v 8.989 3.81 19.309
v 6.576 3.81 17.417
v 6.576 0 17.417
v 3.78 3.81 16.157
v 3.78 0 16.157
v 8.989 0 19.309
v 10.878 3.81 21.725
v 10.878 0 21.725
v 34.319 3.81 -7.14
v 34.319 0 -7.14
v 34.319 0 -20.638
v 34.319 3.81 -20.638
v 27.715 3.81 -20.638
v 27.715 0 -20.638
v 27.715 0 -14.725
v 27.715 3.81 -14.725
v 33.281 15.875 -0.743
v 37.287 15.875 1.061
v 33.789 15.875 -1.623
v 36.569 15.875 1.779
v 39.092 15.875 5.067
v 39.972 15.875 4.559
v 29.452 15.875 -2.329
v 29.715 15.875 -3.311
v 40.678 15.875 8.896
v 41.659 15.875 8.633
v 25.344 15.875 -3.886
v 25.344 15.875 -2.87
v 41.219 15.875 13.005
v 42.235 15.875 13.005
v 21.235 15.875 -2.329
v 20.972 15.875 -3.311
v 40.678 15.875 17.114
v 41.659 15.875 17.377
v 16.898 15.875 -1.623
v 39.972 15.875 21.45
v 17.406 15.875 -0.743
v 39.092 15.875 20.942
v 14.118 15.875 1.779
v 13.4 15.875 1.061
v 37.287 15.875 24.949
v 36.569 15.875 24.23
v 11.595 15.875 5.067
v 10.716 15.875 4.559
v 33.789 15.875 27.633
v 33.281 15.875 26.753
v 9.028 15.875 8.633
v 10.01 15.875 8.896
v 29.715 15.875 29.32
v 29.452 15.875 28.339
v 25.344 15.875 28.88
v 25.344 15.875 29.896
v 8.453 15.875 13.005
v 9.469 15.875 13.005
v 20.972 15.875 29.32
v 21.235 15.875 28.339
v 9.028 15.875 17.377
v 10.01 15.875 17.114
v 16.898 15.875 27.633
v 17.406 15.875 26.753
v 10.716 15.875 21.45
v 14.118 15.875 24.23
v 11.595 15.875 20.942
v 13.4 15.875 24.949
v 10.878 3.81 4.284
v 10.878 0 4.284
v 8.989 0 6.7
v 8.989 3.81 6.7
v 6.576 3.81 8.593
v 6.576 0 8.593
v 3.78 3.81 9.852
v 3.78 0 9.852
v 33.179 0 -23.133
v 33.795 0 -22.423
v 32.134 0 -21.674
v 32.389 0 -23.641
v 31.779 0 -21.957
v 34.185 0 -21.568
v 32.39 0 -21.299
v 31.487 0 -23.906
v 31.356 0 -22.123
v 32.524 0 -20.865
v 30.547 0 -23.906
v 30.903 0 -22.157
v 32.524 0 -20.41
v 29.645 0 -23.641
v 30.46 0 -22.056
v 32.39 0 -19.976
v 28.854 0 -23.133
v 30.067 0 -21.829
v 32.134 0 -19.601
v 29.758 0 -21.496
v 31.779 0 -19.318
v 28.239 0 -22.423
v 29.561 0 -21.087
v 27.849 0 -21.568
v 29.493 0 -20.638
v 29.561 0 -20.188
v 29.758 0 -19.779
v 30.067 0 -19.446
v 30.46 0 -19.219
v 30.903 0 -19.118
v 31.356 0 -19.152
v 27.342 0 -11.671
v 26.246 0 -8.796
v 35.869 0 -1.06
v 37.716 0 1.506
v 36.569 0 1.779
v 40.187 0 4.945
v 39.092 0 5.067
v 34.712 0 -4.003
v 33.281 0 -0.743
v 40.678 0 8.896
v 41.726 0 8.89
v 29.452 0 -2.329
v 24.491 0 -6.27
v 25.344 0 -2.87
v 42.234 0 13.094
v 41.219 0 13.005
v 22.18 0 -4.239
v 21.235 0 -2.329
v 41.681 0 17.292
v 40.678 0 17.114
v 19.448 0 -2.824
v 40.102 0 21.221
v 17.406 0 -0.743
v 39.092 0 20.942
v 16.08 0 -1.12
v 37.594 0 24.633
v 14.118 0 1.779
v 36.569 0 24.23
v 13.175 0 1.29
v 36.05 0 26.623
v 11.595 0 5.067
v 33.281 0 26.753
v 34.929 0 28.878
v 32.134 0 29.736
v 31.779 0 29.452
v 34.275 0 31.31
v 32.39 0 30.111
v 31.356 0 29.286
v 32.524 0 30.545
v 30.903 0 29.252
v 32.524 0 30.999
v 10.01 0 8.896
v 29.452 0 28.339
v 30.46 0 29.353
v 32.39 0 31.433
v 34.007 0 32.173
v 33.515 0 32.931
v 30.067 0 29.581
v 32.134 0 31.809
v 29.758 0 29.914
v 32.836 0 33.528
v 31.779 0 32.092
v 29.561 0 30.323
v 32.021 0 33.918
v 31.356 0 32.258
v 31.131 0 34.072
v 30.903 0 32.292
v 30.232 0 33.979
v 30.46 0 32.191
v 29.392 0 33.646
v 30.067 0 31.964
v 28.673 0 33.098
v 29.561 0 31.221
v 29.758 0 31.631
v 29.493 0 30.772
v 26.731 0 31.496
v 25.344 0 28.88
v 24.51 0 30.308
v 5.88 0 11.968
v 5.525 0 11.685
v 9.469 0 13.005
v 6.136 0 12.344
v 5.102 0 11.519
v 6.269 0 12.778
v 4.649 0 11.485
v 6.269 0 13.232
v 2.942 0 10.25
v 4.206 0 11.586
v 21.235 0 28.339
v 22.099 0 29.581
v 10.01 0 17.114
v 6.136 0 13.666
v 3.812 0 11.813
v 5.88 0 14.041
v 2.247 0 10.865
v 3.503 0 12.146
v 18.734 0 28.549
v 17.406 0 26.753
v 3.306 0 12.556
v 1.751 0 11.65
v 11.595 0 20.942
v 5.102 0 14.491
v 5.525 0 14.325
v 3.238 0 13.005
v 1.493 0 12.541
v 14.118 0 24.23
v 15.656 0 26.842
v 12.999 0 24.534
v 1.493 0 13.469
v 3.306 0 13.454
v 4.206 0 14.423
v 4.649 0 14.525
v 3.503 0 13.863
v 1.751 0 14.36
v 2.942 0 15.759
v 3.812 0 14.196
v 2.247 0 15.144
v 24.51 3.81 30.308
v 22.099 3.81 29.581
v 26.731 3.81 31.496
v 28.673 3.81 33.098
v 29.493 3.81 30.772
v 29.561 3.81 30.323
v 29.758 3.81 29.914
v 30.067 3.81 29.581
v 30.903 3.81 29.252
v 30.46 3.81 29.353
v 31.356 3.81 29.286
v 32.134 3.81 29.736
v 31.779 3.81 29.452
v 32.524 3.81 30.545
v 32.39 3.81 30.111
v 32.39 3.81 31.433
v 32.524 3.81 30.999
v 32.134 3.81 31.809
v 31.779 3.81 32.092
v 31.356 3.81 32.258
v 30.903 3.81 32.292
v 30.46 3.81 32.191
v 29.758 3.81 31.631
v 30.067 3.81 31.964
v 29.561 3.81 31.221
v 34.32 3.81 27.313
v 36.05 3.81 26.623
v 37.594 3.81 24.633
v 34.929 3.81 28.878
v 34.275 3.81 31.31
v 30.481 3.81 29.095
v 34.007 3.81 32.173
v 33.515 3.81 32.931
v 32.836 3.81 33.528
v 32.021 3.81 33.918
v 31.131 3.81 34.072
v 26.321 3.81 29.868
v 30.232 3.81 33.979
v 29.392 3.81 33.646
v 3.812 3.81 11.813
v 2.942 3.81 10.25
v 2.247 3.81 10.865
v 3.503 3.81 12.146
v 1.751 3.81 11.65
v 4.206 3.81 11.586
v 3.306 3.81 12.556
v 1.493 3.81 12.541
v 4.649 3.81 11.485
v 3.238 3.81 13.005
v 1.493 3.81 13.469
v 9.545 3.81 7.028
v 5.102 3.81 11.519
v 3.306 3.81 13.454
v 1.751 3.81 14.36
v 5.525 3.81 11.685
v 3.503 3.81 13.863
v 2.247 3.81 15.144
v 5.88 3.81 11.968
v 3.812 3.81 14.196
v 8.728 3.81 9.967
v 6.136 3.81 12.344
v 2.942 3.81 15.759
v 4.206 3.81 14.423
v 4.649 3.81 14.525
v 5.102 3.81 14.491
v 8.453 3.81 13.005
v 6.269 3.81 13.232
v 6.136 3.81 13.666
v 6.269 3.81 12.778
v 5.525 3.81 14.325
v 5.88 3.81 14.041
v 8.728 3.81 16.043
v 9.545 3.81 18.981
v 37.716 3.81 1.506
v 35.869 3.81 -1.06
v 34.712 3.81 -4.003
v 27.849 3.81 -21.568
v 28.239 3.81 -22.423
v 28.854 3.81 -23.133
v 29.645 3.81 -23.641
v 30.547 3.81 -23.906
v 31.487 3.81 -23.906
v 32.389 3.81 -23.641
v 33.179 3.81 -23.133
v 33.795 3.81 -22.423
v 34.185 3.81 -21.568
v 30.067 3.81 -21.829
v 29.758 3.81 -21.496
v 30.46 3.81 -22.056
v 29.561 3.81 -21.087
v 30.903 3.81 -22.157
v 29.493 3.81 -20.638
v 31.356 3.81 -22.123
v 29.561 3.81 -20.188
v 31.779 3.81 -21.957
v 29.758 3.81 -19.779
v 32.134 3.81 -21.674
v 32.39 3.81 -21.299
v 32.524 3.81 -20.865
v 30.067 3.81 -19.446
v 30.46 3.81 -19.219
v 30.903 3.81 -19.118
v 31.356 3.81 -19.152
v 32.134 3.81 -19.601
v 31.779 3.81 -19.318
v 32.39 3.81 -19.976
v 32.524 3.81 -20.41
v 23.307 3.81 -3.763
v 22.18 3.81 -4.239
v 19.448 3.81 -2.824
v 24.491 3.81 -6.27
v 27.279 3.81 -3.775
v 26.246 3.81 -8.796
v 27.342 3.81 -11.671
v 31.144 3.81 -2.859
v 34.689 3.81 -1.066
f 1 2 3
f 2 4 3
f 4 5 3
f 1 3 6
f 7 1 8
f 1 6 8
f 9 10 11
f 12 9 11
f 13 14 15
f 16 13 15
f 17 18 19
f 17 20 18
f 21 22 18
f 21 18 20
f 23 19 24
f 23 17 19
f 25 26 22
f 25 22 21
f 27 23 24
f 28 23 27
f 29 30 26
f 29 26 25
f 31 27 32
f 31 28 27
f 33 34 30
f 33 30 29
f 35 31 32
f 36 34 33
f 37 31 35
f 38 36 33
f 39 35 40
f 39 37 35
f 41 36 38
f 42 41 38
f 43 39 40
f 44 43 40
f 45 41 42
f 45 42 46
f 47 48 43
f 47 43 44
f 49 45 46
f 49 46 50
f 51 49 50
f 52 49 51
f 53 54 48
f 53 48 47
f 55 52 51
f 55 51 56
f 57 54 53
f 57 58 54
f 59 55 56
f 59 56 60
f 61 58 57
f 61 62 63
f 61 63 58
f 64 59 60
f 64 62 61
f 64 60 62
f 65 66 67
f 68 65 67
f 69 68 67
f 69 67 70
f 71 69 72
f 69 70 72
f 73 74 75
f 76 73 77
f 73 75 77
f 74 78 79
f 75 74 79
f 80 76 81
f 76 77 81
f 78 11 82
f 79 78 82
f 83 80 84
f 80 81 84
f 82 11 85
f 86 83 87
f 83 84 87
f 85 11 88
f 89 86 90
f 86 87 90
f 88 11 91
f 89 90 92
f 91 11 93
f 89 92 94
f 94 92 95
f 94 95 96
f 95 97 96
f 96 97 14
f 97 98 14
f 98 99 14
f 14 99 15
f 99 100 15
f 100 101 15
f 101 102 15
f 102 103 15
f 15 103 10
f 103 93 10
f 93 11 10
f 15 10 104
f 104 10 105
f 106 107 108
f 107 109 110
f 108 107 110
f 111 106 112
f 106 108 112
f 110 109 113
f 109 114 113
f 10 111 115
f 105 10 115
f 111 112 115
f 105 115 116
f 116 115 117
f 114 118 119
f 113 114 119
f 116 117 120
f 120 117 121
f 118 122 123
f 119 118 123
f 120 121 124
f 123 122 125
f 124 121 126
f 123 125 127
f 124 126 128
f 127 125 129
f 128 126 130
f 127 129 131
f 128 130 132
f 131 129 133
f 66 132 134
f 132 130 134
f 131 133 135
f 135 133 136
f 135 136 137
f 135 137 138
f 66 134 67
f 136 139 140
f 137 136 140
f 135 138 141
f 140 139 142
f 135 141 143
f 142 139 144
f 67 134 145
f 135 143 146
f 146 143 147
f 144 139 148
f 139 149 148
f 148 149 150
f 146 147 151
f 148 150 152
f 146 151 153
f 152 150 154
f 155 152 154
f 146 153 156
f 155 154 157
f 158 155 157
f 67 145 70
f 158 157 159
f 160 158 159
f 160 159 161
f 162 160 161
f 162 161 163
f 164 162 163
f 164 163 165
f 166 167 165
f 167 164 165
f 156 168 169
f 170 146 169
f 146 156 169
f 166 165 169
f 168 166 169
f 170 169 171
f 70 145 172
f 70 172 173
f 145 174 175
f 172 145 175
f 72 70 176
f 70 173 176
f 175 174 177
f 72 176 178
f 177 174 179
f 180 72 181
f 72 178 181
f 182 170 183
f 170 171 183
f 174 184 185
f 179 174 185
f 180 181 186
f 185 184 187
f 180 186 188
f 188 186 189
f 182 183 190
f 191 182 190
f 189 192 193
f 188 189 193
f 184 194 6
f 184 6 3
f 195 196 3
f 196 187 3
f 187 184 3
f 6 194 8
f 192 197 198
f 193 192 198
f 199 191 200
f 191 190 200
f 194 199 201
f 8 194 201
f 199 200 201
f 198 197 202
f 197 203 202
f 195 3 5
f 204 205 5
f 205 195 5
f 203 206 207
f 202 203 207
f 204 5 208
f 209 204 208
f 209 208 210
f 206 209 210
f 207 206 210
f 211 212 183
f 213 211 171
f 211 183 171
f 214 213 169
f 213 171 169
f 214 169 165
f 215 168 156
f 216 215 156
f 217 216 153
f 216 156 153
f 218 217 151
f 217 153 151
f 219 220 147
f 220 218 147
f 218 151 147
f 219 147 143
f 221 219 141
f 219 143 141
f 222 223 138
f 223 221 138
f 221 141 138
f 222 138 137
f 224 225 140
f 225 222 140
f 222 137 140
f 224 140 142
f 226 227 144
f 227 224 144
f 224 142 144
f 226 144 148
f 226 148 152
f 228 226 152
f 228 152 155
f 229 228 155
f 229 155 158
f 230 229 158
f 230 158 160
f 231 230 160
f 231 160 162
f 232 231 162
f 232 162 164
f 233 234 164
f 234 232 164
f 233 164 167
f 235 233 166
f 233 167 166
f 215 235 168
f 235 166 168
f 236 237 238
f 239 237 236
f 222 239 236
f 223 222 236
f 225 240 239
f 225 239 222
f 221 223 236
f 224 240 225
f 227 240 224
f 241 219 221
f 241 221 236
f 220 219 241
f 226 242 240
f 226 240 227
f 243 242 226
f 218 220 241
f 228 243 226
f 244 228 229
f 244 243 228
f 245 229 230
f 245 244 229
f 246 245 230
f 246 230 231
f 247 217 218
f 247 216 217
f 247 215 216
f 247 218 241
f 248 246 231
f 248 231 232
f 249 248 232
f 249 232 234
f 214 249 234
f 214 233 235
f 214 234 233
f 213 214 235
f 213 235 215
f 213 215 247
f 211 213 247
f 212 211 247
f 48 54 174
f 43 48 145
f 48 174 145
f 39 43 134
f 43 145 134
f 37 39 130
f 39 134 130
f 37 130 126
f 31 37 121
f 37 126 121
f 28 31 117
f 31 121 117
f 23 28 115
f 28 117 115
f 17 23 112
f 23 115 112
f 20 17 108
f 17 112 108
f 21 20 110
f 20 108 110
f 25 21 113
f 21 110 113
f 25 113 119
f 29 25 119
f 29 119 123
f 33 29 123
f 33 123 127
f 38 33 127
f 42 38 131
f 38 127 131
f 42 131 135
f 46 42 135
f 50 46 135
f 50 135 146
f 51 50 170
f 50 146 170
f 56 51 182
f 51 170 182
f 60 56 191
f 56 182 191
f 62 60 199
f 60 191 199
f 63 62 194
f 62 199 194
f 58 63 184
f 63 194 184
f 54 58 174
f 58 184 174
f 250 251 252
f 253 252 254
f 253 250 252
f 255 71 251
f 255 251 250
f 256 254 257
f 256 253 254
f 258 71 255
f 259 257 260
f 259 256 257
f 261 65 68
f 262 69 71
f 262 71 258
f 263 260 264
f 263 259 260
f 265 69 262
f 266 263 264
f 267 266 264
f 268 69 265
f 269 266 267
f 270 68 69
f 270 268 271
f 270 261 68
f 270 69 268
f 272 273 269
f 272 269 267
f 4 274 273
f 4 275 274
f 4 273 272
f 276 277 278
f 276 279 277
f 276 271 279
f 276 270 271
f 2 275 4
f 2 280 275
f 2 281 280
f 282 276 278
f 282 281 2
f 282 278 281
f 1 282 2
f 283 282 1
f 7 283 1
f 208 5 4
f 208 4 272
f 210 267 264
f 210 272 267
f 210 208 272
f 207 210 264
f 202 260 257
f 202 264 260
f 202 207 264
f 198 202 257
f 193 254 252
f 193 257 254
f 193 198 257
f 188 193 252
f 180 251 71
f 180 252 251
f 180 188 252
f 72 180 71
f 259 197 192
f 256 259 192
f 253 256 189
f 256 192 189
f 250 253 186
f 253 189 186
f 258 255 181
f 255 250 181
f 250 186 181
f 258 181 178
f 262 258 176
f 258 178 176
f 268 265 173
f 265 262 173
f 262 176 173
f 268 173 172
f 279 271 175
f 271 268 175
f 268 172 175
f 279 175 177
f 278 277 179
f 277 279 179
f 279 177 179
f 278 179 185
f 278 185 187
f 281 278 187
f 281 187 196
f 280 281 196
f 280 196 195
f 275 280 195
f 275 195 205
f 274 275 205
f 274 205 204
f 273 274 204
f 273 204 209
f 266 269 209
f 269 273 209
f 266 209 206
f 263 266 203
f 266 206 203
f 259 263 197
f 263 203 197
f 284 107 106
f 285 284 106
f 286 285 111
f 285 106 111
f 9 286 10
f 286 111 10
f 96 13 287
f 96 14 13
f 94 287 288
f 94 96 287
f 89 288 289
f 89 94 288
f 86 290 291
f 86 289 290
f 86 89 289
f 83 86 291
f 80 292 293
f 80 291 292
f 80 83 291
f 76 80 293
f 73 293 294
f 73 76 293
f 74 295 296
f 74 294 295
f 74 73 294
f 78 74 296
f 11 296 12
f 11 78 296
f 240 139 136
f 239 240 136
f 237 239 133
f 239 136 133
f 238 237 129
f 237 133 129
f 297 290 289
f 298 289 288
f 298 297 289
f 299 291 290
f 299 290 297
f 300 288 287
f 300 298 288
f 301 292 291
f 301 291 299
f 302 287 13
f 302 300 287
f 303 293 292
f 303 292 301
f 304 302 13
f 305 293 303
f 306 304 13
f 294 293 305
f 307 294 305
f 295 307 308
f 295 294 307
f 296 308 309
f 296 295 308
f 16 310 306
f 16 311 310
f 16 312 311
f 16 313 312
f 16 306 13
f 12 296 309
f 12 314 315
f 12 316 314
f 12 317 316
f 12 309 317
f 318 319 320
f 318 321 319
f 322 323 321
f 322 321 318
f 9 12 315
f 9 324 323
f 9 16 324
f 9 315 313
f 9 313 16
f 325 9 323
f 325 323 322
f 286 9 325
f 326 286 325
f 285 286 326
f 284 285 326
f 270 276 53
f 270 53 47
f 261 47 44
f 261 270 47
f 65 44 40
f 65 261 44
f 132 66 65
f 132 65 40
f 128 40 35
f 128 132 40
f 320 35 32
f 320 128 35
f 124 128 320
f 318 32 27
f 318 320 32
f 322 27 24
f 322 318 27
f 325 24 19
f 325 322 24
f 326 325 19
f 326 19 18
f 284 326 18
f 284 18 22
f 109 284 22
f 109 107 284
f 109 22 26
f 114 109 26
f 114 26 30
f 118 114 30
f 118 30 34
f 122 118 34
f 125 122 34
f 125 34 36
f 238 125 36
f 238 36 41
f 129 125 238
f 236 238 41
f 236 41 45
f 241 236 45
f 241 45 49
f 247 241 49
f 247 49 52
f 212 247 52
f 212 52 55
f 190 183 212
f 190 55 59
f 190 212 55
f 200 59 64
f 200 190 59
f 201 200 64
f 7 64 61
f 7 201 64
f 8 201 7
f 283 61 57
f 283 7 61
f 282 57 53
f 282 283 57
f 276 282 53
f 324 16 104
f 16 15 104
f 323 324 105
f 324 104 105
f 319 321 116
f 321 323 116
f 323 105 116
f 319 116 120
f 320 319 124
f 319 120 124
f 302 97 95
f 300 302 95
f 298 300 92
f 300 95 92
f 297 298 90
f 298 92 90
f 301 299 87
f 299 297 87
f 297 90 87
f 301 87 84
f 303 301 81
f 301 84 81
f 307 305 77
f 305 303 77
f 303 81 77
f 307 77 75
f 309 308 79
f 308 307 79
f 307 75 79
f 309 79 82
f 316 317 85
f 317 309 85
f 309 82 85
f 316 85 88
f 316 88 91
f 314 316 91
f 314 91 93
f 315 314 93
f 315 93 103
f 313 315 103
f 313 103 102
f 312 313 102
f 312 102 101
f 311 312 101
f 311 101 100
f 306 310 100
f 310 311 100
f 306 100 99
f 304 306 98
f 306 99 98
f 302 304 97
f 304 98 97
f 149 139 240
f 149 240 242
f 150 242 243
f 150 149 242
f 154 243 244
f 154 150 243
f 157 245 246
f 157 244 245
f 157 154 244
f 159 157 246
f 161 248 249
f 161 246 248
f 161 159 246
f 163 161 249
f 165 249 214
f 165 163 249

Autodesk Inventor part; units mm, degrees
ref_plane "YZ Plane" through (0, 0, 0) normal (1, 0, 0) x (0, 1, 0)
ref_plane "XZ Plane" through (0, 0, 0) normal (0, 1, 0) x (-1, 0, 0)
ref_plane "XY Plane" through (0, 0, 0) normal (0, 0, 1) x (1, 0, 0)
sketch "Sketch2" plane through (0, 0, 0) normal (0, 1, 0) x (-1, 0, 0)
  circle A0 centre (-4.7625, 13.0048) radius 1.524 construction
  circle A1 centre (-25.3436, 13.0048) radius 6.35 construction
  circle A2 centre (-31.0168, 30.7721) radius 1.524 construction
  circle A3 centre (-31.0168, -20.6375) radius 1.524 construction
  line L0 (-38.1807, -25.4) -> (-38.1807, 35.5346) construction
  line L1 (-23.8528, -25.4) -> (-38.1807, -25.4) construction
  line L2 (-23.8528, 0) -> (-23.8528, -25.4) construction
  line L3 (0, 0) -> (-23.8528, 0) construction
  line L4 (0, 26.0096) -> (0, 0) construction
  line L5 (-23.8528, 26.0096) -> (0, 26.0096) construction
  line L6 (-23.8528, 26.0096) -> (-23.8528, 35.5346) construction
  line L7 (-38.1807, 35.5346) -> (-23.8528, 35.5346) construction
  point P0 (-23.8528, 13.0048)
  dimension "d3" = 3.048
  dimension "d4" = 12.7
  dimension "d5" = 90
  dimension "d6" = 23.8528
  dimension "d7" = 38.1807
  dimension "d8" = 26.0096
  dimension "d9" = 25.4
  dimension "d10" = 35.5346
  dimension "d11" = 0
  dimension "d12" = 0
  dimension "d13" = 23.8528
  dimension "d14" = 4.7625
  dimension "d15" = 13.0048
  dimension "d16" = 23.8528
  dimension "d17" = 13.0048
  dimension "d18" = 25.3436
  dimension "d19" = 13.0048
  dimension "d20" = 31.0167
  dimension "d21" = 30.7721
  dimension "d22" = 31.0167
  dimension "d23" = 20.6375
sketch "Sketch3" plane through (0, 0, 0) normal (0, 1, 0) x (-1, 0, 0)
  circle A0 centre (-25.3436, 13.0048) radius 15.875
  circle A1 centre (-31.0168, 30.7721) radius 1.524
  circle A2 centre (-4.7625, 13.0048) radius 1.524
  circle A3 centre (-31.0168, -20.6375) radius 1.524
  line L0 (-31.0168, 30.7721) -> (-31.0168, -20.6375) construction
  line L1 (-4.7625, 13.0048) -> (-31.0168, 13.0048) construction
  line L2 (-4.7625, 13.0048) -> (-3.2385, 13.0048) construction
  line L3 (-3.2385, 13.0048) -> (-3.2385, 32.2961) construction
  line L4 (-3.2385, 32.2961) -> (-31.0168, 32.2961) construction
  line L5 (-3.2385, 13.0048) -> (-3.2385, -22.1615) construction
  line L6 (-3.2385, -22.1615) -> (-31.0168, -22.1615) construction
  line L7 (-32.5408, 30.7721) -> (-32.5408, -22.1615) construction
  line L8 (-32.5408, -22.1615) -> (-31.0168, -22.1615) construction
  line L9 (-31.0168, 32.2961) -> (-32.5408, 32.2961) construction
  line L10 (-32.5408, 32.2961) -> (-32.5408, 30.7721) construction
  line L11 (-31.0168, 42.8789) -> (7.3443, 42.8789) construction
  line L12 (7.3443, 42.8789) -> (7.3443, 13.0048) construction
  line L13 (7.3443, 13.0048) -> (7.3443, -32.7443) construction
  line L14 (7.3443, -32.7443) -> (-15.7768, -32.7443) construction
  line L15 (-15.7768, -32.7443) -> (-27.8836, -32.7443) construction
  line L16 (-43.1236, 30.7721) -> (-43.1236, 42.8789) construction
  line L17 (-43.1236, 42.8789) -> (-31.0168, 42.8789) construction
  line L18 (-25.3436, 13.0048) -> (-35.5036, 13.0048) construction
  arc A4 (-25.3436, -2.8702) -> (-25.3436, 28.8798) centre (-25.3436, 13.0048) ccw
  line L19 (-27.8836, -32.7443) -> (-27.8836, -2.8702) construction
  line L20 (-43.1236, 28.8798) -> (-43.1236, 30.7721) construction
  line L21 (-34.3188, 30.7721) -> (-34.3188, 27.314)
  line L22 (-34.3188, -1.3044) -> (-34.3188, -20.6375)
  circle A5 centre (-25.3436, 13.0048) radius 16.891
  line L23 (-4.7625, 13.0048) -> (-25.3436, 13.0048) construction
  line L24 (-4.7625, 16.3068) -> (-8.7785, 16.3068)
  line L25 (-8.7785, 9.7028) -> (-4.7625, 9.7028)
  arc A6 (-4.7625, 9.7028) -> (-4.7625, 16.3068) centre (-4.7625, 13.0048) ccw
  line L26 (-31.0168, -20.6375) -> (-31.0168, 13.0048) construction
  line L27 (-27.7148, -20.6375) -> (-27.7148, -3.7189)
  line L28 (-34.3188, -1.3044) -> (-34.3188, -20.6375)
  arc A7 (-34.3188, -20.6375) -> (-27.7148, -20.6375) centre (-31.0168, -20.6375) ccw
  line L29 (-31.0168, 30.7721) -> (-31.0168, 13.0048) construction
  line L30 (-34.3188, 30.7721) -> (-34.3188, 27.314)
  arc A8 (-27.7148, 30.7721) -> (-34.3188, 30.7721) centre (-31.0168, 30.7721) ccw
  line L31 (-27.7148, 29.7285) -> (-27.7148, 30.7721)
  arc A9 (-30.2144, -23.8405) -> (-1.4605, 13.0048) centre (-39.4443, 13.0048) ccw construction
  arc A10 (-1.4605, 13.0048) -> (-32.2443, 33.8374) centre (-23.9015, 13.0048) ccw construction
  point P0 (0, 0)
  point P1 (-30.4236, 13.0048)
  point P2 (-15.053, 13.0048)
  point P3 (-31.0168, -3.8163)
  point P4 (-31.0168, 21.8885)
  dimension "d26" = 3.048
  dimension "d27" = 3.048
  dimension "d24" = 31.75
  dimension "d25" = 3.048
  dimension "d32" = 10.16
  dimension "d36" = 1.778
  dimension "d38" = 1.778
  dimension "d40" = 1.016
  dimension "d44" = 6.604
  dimension "d45" = 4.016
extrude "Extrusion1" add sketch "Sketch3" along normal blind 15.875 contours A5
extrude "Extrusion2" add sketch "Sketch3" along normal blind 3.81 contours A8 L31 A5 L21 | A5 L27 A7 L22 | L24 A6 L25 A5
fillet "Fillet1" radius 12.7 6 edges at (27.7148, 1.905, 29.7285) (34.3188, 1.905, 27.314) (34.3188, 1.905, -1.3044) (8.7785, 1.905, 9.7028) (27.7148, 1.905, -3.7189) (8.7785, 1.905, 16.3068)
properties part number "DPLX_P020_Camera Shroud Base_RevA"
